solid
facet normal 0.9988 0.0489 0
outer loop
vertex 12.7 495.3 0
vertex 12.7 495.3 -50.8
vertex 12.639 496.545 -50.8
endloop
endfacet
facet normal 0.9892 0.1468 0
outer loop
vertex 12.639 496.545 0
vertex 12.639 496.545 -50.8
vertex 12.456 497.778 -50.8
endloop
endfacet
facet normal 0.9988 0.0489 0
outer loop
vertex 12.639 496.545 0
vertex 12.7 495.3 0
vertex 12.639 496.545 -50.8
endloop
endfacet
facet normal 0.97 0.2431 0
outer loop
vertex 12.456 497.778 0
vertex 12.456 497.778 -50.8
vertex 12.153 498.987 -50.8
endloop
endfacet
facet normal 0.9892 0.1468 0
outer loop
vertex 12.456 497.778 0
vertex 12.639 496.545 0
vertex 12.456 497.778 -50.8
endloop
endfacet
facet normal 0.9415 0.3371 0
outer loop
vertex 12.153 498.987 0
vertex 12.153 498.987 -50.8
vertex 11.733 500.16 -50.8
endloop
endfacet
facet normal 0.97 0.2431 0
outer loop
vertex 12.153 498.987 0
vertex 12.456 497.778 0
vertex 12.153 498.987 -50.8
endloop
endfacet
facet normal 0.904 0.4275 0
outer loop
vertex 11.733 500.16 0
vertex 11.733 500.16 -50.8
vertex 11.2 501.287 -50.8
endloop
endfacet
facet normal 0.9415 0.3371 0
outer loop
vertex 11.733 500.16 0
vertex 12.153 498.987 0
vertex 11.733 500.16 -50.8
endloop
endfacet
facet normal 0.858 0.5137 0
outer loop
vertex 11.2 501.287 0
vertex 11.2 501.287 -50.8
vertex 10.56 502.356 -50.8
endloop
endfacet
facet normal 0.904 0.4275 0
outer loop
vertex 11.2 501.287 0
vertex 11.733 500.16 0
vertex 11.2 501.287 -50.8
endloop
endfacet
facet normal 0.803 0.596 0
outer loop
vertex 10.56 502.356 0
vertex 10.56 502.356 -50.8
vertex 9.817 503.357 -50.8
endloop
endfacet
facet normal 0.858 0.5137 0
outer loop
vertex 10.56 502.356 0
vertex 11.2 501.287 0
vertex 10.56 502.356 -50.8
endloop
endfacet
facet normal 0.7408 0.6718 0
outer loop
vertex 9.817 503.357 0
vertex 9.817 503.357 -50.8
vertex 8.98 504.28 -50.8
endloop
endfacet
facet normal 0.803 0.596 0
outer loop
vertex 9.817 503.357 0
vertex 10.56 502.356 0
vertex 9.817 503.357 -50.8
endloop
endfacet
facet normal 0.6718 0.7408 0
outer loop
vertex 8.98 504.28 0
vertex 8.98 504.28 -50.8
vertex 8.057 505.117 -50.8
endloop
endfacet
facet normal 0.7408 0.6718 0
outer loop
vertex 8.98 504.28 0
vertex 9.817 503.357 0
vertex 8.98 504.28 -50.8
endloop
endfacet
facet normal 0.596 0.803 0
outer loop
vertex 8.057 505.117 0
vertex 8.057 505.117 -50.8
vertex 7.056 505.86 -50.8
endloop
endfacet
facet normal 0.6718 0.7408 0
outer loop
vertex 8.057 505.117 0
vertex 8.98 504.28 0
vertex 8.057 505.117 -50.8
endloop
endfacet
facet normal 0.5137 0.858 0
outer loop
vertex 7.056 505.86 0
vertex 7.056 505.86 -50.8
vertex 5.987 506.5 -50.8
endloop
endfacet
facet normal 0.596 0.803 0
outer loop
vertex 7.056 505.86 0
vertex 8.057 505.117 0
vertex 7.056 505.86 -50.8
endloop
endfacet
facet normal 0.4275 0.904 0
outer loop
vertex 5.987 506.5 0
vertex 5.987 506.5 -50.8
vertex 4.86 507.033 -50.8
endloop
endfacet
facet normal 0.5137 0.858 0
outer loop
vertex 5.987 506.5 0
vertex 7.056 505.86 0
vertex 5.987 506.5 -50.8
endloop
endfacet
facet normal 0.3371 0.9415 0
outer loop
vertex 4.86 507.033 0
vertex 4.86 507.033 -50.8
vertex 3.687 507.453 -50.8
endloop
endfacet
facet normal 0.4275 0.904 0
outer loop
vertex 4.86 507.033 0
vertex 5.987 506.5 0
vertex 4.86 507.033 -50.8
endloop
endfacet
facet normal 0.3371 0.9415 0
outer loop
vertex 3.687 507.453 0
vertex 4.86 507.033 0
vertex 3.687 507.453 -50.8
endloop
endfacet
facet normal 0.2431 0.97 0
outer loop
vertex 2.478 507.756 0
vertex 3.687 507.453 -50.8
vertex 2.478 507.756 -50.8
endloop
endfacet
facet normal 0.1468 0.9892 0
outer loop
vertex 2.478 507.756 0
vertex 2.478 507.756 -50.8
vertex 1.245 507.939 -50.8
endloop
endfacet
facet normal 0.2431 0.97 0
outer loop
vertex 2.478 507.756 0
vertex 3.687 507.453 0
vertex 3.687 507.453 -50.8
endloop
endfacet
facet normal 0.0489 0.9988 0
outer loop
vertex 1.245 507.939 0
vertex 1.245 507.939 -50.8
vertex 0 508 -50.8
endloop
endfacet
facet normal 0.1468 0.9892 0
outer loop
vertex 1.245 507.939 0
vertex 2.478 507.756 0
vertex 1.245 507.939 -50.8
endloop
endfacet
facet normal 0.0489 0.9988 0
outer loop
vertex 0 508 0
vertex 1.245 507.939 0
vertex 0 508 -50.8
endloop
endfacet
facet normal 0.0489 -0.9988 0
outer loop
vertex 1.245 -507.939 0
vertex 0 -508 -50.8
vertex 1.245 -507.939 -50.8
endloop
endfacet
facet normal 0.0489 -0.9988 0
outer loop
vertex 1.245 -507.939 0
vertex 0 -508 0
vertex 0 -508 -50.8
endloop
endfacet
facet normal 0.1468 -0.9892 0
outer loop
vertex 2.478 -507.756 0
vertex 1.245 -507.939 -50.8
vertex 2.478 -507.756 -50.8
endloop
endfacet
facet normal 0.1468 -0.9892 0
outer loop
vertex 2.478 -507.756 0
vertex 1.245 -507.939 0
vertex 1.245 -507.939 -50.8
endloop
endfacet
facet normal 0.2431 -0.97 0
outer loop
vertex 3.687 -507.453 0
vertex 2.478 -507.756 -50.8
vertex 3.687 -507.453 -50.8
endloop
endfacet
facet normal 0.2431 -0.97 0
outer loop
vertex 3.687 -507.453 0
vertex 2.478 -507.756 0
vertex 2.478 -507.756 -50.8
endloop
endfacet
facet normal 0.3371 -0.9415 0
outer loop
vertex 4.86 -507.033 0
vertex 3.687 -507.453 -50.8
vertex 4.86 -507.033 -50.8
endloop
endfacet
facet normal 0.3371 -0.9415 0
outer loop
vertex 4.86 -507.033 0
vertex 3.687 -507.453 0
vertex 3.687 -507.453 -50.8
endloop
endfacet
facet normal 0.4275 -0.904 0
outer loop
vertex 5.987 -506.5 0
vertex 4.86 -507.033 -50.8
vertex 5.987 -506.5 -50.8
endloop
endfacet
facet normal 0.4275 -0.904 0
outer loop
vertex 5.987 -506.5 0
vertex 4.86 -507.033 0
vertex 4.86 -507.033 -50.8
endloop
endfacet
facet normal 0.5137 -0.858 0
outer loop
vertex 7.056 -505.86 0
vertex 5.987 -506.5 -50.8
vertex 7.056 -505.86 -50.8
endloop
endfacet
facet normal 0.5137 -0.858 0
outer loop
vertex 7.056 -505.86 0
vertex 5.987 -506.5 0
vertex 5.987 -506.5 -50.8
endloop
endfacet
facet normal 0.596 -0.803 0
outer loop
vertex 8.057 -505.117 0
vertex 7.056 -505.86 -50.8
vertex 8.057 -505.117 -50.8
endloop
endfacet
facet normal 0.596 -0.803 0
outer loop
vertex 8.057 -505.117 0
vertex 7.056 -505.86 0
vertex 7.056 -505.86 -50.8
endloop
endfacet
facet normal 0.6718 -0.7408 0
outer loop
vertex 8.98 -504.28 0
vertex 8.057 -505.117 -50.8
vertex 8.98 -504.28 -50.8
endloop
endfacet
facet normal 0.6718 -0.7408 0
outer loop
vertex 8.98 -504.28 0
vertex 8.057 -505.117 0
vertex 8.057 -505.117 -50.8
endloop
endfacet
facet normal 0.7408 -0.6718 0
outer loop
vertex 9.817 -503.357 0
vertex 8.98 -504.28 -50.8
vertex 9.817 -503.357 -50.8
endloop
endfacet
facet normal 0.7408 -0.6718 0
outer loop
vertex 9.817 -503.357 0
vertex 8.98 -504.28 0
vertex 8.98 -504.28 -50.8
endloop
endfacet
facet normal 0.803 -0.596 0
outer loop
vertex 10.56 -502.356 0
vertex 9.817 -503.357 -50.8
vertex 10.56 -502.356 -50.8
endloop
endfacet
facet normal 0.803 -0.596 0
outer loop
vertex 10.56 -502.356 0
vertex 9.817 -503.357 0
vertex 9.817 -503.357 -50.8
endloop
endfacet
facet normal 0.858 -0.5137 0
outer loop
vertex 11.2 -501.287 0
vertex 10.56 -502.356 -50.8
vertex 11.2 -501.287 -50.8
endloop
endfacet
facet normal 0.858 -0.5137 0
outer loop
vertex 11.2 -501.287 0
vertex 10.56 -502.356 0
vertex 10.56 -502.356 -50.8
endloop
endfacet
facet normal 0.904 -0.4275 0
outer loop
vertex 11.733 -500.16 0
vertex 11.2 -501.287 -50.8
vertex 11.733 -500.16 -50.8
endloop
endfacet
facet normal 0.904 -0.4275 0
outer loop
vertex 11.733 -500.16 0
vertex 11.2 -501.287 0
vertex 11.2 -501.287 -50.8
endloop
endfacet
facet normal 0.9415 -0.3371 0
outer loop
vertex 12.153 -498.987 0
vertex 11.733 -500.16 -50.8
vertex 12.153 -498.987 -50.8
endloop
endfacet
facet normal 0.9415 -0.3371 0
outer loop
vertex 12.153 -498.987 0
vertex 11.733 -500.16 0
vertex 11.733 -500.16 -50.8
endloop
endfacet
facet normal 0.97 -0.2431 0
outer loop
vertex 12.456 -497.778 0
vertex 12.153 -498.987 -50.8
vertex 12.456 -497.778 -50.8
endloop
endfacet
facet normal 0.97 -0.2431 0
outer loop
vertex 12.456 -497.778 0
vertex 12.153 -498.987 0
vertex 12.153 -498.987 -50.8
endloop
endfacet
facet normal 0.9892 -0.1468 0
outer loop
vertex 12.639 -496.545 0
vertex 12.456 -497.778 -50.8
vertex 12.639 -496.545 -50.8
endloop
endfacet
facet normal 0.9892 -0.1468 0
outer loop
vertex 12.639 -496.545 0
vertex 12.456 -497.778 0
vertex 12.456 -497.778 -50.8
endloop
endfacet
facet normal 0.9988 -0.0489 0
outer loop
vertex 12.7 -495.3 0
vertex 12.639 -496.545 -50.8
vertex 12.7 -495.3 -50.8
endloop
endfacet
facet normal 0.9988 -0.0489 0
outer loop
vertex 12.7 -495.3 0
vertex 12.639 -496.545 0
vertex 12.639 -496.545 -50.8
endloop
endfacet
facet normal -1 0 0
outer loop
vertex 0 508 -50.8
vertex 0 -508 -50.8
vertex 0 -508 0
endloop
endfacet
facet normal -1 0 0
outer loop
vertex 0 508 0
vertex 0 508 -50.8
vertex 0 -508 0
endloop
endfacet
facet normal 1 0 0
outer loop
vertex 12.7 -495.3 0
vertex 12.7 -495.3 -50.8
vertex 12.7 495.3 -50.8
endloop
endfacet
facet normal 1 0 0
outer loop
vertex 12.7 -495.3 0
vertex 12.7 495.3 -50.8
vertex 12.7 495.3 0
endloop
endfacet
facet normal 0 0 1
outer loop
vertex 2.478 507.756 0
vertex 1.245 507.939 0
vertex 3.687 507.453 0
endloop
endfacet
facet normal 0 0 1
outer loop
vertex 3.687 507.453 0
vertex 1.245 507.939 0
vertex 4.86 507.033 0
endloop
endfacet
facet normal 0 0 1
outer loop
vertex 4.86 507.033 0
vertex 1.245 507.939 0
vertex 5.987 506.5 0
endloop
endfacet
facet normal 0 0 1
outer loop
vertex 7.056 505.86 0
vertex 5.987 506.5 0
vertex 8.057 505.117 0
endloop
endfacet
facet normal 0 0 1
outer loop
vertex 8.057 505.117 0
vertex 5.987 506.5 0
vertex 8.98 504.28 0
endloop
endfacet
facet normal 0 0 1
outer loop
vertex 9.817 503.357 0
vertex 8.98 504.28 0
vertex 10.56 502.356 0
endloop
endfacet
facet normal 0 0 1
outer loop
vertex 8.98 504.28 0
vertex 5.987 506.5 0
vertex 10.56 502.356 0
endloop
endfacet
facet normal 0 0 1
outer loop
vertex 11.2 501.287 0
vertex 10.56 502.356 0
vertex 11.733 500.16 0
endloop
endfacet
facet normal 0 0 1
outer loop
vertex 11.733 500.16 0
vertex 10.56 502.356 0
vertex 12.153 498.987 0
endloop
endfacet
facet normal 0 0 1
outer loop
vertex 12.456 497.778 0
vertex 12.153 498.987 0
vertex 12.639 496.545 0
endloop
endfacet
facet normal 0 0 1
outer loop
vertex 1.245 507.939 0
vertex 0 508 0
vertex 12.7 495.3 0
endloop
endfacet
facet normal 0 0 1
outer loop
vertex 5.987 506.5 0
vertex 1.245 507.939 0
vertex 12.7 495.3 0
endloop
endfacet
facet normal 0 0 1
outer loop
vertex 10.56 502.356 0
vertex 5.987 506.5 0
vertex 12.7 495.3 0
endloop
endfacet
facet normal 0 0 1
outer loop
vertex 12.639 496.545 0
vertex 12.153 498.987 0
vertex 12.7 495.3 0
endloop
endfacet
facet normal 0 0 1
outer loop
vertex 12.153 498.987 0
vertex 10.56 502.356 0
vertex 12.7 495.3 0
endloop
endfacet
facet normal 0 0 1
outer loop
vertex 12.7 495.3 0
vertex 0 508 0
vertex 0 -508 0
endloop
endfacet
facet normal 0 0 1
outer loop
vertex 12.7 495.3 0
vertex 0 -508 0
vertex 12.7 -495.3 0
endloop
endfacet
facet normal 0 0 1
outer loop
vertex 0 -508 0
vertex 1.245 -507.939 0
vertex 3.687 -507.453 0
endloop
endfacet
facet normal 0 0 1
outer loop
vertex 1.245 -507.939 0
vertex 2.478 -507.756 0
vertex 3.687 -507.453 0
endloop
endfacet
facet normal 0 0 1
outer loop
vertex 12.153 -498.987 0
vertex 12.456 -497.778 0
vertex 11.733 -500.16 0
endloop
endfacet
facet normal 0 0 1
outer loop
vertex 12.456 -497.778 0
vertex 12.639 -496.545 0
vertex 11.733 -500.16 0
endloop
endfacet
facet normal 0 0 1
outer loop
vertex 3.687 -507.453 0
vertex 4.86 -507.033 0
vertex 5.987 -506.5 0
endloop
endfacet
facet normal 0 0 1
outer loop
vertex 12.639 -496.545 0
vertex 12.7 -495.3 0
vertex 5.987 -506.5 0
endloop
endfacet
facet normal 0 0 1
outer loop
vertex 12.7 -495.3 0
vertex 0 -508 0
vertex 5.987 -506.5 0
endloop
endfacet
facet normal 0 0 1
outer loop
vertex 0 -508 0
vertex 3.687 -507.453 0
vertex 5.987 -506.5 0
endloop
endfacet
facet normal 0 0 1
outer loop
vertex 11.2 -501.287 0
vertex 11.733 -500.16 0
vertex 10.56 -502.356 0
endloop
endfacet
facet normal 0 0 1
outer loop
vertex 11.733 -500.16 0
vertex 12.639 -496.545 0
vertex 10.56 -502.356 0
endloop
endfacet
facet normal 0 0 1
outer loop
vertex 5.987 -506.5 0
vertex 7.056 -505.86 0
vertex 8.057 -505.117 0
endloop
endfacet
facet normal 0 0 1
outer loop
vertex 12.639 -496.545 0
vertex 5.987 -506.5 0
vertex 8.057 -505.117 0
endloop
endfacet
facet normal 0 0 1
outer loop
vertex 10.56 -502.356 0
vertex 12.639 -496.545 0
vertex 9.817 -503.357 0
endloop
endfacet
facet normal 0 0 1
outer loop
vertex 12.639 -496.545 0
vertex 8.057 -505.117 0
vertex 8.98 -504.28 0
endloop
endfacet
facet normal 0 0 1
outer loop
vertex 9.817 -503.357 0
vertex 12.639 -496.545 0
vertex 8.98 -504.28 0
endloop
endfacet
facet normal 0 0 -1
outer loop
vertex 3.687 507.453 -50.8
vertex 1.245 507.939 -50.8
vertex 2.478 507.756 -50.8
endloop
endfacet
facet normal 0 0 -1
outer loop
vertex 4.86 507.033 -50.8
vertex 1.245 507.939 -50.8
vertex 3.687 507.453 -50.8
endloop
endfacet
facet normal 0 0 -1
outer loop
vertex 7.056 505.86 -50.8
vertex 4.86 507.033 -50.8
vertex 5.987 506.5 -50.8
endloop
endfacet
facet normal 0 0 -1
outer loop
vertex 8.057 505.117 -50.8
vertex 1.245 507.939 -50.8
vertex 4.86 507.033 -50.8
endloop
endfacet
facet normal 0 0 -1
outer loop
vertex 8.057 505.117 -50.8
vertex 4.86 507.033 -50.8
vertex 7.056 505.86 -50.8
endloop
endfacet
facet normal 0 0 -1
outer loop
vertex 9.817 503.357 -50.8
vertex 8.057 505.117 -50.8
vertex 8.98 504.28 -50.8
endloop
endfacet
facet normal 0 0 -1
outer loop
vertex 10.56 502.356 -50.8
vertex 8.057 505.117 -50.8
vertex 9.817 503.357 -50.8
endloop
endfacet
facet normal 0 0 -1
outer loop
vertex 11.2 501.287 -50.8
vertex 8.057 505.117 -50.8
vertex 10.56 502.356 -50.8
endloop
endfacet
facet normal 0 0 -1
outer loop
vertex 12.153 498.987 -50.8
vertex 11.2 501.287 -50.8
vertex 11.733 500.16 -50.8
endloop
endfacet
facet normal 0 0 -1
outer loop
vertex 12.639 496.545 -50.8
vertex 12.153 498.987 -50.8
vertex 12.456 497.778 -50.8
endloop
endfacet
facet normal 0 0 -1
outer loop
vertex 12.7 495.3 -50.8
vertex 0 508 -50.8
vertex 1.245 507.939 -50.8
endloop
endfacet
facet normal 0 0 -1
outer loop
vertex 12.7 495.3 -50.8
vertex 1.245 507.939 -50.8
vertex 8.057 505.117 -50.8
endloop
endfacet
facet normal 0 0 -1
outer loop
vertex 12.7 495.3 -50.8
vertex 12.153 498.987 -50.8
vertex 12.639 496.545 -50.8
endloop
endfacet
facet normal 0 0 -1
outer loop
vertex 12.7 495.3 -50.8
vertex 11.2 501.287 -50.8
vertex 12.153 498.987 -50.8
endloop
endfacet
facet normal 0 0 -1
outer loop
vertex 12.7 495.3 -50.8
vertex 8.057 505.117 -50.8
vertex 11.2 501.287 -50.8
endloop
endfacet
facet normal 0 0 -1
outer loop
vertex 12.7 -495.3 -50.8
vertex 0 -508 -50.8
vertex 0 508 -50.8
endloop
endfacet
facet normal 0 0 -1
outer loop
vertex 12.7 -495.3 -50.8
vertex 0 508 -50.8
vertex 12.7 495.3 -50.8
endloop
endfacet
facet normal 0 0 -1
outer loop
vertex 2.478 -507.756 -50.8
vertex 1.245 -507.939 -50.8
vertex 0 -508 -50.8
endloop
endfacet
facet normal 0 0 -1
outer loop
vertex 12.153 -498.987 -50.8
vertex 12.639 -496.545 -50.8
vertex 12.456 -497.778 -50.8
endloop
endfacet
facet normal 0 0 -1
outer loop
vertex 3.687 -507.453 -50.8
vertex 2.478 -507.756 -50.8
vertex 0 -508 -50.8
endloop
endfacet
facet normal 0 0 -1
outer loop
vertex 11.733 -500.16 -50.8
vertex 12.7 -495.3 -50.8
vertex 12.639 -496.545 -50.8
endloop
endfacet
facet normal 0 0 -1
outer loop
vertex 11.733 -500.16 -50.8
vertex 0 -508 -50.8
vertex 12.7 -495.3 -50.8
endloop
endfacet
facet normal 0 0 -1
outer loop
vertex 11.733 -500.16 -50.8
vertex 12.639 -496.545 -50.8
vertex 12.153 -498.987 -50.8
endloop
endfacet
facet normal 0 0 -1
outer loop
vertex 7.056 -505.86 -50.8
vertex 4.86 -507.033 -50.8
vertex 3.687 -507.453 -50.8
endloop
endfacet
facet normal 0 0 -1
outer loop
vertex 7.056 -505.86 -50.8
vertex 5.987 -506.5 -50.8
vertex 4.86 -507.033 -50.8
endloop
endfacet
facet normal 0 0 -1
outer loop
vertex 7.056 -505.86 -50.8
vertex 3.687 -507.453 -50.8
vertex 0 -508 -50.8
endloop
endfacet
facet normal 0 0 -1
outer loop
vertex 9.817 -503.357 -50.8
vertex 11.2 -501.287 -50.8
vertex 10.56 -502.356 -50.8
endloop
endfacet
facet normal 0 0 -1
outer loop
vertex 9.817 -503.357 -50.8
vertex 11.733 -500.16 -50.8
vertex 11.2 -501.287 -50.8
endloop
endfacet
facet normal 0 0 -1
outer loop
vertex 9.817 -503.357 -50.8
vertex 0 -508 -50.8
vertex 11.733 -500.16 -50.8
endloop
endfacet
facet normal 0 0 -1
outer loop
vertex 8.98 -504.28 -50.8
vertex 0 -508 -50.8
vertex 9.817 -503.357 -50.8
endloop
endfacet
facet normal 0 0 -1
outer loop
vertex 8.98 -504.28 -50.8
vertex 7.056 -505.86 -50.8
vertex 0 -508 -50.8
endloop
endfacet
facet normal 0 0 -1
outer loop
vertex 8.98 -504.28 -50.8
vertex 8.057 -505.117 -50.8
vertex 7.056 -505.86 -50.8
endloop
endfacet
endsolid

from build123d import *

# Parameters (mm, degrees)
F0_W     = 12.7
F0_H     = 50.8
F1_DEPTH = 508
F2_R     = 12.69999


# Not quite as in the source:
# - a fillet or chamfer is up to 0.001 mm smaller than in the source, because OpenCascade refuses the exact size


with BuildPart() as f1:
    # F0 (on Front) → F1 (new body, symmetric)
    with BuildSketch(Plane.XZ):
        with Locations((6.35, -25.4)):
            Rectangle(F0_W, F0_H)
    extrude(amount=F1_DEPTH, both=True)

    # F2 (radius 12.7 in the source; OpenCascade refuses exactly that, so slightly less here)
    f2_edges = [f1.edges().sort_by_distance(p)[0] for p in [
        (12.7, -508, -25.4),
        (12.7, 508, -25.4),
    ]]
    fillet(f2_edges, radius=F2_R)


solid = f1.part
